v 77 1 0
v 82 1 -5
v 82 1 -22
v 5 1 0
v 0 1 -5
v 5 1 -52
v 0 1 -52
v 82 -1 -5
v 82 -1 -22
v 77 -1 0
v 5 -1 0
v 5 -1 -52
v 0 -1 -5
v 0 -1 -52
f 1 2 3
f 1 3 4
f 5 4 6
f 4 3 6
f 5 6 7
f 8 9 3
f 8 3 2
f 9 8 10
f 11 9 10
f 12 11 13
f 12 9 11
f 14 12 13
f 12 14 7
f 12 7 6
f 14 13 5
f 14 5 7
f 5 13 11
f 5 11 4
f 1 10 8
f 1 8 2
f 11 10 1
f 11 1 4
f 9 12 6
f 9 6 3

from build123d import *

# Parameters (mm, degrees)
EXTRUDE_1_DEPTH      = 1
EXTRUDE_1_DEPTH_BACK = 1
CHAMFER_2_SIZE       = 5


with BuildPart() as part:
    # Эскиз1 → Бобышка-Вытянуть1 (new, two sides: drawn at the far end of the back side and taken through both)
    with BuildSketch(Plane(origin=(0, 0, 0), x_dir=(1, 0, 0), z_dir=(0, 1, 0)).offset(-EXTRUDE_1_DEPTH_BACK)):
        Polygon((5, 52), (82, 22), (82, 0), (0, 0), (0, 52), align=None)
    extrude(amount=EXTRUDE_1_DEPTH + EXTRUDE_1_DEPTH_BACK)

    # Фаска2
    chamfer_2_edges = [part.edges().sort_by_distance(p)[0] for p in [
        (0, 0, 0),
        (82, 0, 0),
    ]]
    chamfer(chamfer_2_edges, length=CHAMFER_2_SIZE)


solid = part.part
